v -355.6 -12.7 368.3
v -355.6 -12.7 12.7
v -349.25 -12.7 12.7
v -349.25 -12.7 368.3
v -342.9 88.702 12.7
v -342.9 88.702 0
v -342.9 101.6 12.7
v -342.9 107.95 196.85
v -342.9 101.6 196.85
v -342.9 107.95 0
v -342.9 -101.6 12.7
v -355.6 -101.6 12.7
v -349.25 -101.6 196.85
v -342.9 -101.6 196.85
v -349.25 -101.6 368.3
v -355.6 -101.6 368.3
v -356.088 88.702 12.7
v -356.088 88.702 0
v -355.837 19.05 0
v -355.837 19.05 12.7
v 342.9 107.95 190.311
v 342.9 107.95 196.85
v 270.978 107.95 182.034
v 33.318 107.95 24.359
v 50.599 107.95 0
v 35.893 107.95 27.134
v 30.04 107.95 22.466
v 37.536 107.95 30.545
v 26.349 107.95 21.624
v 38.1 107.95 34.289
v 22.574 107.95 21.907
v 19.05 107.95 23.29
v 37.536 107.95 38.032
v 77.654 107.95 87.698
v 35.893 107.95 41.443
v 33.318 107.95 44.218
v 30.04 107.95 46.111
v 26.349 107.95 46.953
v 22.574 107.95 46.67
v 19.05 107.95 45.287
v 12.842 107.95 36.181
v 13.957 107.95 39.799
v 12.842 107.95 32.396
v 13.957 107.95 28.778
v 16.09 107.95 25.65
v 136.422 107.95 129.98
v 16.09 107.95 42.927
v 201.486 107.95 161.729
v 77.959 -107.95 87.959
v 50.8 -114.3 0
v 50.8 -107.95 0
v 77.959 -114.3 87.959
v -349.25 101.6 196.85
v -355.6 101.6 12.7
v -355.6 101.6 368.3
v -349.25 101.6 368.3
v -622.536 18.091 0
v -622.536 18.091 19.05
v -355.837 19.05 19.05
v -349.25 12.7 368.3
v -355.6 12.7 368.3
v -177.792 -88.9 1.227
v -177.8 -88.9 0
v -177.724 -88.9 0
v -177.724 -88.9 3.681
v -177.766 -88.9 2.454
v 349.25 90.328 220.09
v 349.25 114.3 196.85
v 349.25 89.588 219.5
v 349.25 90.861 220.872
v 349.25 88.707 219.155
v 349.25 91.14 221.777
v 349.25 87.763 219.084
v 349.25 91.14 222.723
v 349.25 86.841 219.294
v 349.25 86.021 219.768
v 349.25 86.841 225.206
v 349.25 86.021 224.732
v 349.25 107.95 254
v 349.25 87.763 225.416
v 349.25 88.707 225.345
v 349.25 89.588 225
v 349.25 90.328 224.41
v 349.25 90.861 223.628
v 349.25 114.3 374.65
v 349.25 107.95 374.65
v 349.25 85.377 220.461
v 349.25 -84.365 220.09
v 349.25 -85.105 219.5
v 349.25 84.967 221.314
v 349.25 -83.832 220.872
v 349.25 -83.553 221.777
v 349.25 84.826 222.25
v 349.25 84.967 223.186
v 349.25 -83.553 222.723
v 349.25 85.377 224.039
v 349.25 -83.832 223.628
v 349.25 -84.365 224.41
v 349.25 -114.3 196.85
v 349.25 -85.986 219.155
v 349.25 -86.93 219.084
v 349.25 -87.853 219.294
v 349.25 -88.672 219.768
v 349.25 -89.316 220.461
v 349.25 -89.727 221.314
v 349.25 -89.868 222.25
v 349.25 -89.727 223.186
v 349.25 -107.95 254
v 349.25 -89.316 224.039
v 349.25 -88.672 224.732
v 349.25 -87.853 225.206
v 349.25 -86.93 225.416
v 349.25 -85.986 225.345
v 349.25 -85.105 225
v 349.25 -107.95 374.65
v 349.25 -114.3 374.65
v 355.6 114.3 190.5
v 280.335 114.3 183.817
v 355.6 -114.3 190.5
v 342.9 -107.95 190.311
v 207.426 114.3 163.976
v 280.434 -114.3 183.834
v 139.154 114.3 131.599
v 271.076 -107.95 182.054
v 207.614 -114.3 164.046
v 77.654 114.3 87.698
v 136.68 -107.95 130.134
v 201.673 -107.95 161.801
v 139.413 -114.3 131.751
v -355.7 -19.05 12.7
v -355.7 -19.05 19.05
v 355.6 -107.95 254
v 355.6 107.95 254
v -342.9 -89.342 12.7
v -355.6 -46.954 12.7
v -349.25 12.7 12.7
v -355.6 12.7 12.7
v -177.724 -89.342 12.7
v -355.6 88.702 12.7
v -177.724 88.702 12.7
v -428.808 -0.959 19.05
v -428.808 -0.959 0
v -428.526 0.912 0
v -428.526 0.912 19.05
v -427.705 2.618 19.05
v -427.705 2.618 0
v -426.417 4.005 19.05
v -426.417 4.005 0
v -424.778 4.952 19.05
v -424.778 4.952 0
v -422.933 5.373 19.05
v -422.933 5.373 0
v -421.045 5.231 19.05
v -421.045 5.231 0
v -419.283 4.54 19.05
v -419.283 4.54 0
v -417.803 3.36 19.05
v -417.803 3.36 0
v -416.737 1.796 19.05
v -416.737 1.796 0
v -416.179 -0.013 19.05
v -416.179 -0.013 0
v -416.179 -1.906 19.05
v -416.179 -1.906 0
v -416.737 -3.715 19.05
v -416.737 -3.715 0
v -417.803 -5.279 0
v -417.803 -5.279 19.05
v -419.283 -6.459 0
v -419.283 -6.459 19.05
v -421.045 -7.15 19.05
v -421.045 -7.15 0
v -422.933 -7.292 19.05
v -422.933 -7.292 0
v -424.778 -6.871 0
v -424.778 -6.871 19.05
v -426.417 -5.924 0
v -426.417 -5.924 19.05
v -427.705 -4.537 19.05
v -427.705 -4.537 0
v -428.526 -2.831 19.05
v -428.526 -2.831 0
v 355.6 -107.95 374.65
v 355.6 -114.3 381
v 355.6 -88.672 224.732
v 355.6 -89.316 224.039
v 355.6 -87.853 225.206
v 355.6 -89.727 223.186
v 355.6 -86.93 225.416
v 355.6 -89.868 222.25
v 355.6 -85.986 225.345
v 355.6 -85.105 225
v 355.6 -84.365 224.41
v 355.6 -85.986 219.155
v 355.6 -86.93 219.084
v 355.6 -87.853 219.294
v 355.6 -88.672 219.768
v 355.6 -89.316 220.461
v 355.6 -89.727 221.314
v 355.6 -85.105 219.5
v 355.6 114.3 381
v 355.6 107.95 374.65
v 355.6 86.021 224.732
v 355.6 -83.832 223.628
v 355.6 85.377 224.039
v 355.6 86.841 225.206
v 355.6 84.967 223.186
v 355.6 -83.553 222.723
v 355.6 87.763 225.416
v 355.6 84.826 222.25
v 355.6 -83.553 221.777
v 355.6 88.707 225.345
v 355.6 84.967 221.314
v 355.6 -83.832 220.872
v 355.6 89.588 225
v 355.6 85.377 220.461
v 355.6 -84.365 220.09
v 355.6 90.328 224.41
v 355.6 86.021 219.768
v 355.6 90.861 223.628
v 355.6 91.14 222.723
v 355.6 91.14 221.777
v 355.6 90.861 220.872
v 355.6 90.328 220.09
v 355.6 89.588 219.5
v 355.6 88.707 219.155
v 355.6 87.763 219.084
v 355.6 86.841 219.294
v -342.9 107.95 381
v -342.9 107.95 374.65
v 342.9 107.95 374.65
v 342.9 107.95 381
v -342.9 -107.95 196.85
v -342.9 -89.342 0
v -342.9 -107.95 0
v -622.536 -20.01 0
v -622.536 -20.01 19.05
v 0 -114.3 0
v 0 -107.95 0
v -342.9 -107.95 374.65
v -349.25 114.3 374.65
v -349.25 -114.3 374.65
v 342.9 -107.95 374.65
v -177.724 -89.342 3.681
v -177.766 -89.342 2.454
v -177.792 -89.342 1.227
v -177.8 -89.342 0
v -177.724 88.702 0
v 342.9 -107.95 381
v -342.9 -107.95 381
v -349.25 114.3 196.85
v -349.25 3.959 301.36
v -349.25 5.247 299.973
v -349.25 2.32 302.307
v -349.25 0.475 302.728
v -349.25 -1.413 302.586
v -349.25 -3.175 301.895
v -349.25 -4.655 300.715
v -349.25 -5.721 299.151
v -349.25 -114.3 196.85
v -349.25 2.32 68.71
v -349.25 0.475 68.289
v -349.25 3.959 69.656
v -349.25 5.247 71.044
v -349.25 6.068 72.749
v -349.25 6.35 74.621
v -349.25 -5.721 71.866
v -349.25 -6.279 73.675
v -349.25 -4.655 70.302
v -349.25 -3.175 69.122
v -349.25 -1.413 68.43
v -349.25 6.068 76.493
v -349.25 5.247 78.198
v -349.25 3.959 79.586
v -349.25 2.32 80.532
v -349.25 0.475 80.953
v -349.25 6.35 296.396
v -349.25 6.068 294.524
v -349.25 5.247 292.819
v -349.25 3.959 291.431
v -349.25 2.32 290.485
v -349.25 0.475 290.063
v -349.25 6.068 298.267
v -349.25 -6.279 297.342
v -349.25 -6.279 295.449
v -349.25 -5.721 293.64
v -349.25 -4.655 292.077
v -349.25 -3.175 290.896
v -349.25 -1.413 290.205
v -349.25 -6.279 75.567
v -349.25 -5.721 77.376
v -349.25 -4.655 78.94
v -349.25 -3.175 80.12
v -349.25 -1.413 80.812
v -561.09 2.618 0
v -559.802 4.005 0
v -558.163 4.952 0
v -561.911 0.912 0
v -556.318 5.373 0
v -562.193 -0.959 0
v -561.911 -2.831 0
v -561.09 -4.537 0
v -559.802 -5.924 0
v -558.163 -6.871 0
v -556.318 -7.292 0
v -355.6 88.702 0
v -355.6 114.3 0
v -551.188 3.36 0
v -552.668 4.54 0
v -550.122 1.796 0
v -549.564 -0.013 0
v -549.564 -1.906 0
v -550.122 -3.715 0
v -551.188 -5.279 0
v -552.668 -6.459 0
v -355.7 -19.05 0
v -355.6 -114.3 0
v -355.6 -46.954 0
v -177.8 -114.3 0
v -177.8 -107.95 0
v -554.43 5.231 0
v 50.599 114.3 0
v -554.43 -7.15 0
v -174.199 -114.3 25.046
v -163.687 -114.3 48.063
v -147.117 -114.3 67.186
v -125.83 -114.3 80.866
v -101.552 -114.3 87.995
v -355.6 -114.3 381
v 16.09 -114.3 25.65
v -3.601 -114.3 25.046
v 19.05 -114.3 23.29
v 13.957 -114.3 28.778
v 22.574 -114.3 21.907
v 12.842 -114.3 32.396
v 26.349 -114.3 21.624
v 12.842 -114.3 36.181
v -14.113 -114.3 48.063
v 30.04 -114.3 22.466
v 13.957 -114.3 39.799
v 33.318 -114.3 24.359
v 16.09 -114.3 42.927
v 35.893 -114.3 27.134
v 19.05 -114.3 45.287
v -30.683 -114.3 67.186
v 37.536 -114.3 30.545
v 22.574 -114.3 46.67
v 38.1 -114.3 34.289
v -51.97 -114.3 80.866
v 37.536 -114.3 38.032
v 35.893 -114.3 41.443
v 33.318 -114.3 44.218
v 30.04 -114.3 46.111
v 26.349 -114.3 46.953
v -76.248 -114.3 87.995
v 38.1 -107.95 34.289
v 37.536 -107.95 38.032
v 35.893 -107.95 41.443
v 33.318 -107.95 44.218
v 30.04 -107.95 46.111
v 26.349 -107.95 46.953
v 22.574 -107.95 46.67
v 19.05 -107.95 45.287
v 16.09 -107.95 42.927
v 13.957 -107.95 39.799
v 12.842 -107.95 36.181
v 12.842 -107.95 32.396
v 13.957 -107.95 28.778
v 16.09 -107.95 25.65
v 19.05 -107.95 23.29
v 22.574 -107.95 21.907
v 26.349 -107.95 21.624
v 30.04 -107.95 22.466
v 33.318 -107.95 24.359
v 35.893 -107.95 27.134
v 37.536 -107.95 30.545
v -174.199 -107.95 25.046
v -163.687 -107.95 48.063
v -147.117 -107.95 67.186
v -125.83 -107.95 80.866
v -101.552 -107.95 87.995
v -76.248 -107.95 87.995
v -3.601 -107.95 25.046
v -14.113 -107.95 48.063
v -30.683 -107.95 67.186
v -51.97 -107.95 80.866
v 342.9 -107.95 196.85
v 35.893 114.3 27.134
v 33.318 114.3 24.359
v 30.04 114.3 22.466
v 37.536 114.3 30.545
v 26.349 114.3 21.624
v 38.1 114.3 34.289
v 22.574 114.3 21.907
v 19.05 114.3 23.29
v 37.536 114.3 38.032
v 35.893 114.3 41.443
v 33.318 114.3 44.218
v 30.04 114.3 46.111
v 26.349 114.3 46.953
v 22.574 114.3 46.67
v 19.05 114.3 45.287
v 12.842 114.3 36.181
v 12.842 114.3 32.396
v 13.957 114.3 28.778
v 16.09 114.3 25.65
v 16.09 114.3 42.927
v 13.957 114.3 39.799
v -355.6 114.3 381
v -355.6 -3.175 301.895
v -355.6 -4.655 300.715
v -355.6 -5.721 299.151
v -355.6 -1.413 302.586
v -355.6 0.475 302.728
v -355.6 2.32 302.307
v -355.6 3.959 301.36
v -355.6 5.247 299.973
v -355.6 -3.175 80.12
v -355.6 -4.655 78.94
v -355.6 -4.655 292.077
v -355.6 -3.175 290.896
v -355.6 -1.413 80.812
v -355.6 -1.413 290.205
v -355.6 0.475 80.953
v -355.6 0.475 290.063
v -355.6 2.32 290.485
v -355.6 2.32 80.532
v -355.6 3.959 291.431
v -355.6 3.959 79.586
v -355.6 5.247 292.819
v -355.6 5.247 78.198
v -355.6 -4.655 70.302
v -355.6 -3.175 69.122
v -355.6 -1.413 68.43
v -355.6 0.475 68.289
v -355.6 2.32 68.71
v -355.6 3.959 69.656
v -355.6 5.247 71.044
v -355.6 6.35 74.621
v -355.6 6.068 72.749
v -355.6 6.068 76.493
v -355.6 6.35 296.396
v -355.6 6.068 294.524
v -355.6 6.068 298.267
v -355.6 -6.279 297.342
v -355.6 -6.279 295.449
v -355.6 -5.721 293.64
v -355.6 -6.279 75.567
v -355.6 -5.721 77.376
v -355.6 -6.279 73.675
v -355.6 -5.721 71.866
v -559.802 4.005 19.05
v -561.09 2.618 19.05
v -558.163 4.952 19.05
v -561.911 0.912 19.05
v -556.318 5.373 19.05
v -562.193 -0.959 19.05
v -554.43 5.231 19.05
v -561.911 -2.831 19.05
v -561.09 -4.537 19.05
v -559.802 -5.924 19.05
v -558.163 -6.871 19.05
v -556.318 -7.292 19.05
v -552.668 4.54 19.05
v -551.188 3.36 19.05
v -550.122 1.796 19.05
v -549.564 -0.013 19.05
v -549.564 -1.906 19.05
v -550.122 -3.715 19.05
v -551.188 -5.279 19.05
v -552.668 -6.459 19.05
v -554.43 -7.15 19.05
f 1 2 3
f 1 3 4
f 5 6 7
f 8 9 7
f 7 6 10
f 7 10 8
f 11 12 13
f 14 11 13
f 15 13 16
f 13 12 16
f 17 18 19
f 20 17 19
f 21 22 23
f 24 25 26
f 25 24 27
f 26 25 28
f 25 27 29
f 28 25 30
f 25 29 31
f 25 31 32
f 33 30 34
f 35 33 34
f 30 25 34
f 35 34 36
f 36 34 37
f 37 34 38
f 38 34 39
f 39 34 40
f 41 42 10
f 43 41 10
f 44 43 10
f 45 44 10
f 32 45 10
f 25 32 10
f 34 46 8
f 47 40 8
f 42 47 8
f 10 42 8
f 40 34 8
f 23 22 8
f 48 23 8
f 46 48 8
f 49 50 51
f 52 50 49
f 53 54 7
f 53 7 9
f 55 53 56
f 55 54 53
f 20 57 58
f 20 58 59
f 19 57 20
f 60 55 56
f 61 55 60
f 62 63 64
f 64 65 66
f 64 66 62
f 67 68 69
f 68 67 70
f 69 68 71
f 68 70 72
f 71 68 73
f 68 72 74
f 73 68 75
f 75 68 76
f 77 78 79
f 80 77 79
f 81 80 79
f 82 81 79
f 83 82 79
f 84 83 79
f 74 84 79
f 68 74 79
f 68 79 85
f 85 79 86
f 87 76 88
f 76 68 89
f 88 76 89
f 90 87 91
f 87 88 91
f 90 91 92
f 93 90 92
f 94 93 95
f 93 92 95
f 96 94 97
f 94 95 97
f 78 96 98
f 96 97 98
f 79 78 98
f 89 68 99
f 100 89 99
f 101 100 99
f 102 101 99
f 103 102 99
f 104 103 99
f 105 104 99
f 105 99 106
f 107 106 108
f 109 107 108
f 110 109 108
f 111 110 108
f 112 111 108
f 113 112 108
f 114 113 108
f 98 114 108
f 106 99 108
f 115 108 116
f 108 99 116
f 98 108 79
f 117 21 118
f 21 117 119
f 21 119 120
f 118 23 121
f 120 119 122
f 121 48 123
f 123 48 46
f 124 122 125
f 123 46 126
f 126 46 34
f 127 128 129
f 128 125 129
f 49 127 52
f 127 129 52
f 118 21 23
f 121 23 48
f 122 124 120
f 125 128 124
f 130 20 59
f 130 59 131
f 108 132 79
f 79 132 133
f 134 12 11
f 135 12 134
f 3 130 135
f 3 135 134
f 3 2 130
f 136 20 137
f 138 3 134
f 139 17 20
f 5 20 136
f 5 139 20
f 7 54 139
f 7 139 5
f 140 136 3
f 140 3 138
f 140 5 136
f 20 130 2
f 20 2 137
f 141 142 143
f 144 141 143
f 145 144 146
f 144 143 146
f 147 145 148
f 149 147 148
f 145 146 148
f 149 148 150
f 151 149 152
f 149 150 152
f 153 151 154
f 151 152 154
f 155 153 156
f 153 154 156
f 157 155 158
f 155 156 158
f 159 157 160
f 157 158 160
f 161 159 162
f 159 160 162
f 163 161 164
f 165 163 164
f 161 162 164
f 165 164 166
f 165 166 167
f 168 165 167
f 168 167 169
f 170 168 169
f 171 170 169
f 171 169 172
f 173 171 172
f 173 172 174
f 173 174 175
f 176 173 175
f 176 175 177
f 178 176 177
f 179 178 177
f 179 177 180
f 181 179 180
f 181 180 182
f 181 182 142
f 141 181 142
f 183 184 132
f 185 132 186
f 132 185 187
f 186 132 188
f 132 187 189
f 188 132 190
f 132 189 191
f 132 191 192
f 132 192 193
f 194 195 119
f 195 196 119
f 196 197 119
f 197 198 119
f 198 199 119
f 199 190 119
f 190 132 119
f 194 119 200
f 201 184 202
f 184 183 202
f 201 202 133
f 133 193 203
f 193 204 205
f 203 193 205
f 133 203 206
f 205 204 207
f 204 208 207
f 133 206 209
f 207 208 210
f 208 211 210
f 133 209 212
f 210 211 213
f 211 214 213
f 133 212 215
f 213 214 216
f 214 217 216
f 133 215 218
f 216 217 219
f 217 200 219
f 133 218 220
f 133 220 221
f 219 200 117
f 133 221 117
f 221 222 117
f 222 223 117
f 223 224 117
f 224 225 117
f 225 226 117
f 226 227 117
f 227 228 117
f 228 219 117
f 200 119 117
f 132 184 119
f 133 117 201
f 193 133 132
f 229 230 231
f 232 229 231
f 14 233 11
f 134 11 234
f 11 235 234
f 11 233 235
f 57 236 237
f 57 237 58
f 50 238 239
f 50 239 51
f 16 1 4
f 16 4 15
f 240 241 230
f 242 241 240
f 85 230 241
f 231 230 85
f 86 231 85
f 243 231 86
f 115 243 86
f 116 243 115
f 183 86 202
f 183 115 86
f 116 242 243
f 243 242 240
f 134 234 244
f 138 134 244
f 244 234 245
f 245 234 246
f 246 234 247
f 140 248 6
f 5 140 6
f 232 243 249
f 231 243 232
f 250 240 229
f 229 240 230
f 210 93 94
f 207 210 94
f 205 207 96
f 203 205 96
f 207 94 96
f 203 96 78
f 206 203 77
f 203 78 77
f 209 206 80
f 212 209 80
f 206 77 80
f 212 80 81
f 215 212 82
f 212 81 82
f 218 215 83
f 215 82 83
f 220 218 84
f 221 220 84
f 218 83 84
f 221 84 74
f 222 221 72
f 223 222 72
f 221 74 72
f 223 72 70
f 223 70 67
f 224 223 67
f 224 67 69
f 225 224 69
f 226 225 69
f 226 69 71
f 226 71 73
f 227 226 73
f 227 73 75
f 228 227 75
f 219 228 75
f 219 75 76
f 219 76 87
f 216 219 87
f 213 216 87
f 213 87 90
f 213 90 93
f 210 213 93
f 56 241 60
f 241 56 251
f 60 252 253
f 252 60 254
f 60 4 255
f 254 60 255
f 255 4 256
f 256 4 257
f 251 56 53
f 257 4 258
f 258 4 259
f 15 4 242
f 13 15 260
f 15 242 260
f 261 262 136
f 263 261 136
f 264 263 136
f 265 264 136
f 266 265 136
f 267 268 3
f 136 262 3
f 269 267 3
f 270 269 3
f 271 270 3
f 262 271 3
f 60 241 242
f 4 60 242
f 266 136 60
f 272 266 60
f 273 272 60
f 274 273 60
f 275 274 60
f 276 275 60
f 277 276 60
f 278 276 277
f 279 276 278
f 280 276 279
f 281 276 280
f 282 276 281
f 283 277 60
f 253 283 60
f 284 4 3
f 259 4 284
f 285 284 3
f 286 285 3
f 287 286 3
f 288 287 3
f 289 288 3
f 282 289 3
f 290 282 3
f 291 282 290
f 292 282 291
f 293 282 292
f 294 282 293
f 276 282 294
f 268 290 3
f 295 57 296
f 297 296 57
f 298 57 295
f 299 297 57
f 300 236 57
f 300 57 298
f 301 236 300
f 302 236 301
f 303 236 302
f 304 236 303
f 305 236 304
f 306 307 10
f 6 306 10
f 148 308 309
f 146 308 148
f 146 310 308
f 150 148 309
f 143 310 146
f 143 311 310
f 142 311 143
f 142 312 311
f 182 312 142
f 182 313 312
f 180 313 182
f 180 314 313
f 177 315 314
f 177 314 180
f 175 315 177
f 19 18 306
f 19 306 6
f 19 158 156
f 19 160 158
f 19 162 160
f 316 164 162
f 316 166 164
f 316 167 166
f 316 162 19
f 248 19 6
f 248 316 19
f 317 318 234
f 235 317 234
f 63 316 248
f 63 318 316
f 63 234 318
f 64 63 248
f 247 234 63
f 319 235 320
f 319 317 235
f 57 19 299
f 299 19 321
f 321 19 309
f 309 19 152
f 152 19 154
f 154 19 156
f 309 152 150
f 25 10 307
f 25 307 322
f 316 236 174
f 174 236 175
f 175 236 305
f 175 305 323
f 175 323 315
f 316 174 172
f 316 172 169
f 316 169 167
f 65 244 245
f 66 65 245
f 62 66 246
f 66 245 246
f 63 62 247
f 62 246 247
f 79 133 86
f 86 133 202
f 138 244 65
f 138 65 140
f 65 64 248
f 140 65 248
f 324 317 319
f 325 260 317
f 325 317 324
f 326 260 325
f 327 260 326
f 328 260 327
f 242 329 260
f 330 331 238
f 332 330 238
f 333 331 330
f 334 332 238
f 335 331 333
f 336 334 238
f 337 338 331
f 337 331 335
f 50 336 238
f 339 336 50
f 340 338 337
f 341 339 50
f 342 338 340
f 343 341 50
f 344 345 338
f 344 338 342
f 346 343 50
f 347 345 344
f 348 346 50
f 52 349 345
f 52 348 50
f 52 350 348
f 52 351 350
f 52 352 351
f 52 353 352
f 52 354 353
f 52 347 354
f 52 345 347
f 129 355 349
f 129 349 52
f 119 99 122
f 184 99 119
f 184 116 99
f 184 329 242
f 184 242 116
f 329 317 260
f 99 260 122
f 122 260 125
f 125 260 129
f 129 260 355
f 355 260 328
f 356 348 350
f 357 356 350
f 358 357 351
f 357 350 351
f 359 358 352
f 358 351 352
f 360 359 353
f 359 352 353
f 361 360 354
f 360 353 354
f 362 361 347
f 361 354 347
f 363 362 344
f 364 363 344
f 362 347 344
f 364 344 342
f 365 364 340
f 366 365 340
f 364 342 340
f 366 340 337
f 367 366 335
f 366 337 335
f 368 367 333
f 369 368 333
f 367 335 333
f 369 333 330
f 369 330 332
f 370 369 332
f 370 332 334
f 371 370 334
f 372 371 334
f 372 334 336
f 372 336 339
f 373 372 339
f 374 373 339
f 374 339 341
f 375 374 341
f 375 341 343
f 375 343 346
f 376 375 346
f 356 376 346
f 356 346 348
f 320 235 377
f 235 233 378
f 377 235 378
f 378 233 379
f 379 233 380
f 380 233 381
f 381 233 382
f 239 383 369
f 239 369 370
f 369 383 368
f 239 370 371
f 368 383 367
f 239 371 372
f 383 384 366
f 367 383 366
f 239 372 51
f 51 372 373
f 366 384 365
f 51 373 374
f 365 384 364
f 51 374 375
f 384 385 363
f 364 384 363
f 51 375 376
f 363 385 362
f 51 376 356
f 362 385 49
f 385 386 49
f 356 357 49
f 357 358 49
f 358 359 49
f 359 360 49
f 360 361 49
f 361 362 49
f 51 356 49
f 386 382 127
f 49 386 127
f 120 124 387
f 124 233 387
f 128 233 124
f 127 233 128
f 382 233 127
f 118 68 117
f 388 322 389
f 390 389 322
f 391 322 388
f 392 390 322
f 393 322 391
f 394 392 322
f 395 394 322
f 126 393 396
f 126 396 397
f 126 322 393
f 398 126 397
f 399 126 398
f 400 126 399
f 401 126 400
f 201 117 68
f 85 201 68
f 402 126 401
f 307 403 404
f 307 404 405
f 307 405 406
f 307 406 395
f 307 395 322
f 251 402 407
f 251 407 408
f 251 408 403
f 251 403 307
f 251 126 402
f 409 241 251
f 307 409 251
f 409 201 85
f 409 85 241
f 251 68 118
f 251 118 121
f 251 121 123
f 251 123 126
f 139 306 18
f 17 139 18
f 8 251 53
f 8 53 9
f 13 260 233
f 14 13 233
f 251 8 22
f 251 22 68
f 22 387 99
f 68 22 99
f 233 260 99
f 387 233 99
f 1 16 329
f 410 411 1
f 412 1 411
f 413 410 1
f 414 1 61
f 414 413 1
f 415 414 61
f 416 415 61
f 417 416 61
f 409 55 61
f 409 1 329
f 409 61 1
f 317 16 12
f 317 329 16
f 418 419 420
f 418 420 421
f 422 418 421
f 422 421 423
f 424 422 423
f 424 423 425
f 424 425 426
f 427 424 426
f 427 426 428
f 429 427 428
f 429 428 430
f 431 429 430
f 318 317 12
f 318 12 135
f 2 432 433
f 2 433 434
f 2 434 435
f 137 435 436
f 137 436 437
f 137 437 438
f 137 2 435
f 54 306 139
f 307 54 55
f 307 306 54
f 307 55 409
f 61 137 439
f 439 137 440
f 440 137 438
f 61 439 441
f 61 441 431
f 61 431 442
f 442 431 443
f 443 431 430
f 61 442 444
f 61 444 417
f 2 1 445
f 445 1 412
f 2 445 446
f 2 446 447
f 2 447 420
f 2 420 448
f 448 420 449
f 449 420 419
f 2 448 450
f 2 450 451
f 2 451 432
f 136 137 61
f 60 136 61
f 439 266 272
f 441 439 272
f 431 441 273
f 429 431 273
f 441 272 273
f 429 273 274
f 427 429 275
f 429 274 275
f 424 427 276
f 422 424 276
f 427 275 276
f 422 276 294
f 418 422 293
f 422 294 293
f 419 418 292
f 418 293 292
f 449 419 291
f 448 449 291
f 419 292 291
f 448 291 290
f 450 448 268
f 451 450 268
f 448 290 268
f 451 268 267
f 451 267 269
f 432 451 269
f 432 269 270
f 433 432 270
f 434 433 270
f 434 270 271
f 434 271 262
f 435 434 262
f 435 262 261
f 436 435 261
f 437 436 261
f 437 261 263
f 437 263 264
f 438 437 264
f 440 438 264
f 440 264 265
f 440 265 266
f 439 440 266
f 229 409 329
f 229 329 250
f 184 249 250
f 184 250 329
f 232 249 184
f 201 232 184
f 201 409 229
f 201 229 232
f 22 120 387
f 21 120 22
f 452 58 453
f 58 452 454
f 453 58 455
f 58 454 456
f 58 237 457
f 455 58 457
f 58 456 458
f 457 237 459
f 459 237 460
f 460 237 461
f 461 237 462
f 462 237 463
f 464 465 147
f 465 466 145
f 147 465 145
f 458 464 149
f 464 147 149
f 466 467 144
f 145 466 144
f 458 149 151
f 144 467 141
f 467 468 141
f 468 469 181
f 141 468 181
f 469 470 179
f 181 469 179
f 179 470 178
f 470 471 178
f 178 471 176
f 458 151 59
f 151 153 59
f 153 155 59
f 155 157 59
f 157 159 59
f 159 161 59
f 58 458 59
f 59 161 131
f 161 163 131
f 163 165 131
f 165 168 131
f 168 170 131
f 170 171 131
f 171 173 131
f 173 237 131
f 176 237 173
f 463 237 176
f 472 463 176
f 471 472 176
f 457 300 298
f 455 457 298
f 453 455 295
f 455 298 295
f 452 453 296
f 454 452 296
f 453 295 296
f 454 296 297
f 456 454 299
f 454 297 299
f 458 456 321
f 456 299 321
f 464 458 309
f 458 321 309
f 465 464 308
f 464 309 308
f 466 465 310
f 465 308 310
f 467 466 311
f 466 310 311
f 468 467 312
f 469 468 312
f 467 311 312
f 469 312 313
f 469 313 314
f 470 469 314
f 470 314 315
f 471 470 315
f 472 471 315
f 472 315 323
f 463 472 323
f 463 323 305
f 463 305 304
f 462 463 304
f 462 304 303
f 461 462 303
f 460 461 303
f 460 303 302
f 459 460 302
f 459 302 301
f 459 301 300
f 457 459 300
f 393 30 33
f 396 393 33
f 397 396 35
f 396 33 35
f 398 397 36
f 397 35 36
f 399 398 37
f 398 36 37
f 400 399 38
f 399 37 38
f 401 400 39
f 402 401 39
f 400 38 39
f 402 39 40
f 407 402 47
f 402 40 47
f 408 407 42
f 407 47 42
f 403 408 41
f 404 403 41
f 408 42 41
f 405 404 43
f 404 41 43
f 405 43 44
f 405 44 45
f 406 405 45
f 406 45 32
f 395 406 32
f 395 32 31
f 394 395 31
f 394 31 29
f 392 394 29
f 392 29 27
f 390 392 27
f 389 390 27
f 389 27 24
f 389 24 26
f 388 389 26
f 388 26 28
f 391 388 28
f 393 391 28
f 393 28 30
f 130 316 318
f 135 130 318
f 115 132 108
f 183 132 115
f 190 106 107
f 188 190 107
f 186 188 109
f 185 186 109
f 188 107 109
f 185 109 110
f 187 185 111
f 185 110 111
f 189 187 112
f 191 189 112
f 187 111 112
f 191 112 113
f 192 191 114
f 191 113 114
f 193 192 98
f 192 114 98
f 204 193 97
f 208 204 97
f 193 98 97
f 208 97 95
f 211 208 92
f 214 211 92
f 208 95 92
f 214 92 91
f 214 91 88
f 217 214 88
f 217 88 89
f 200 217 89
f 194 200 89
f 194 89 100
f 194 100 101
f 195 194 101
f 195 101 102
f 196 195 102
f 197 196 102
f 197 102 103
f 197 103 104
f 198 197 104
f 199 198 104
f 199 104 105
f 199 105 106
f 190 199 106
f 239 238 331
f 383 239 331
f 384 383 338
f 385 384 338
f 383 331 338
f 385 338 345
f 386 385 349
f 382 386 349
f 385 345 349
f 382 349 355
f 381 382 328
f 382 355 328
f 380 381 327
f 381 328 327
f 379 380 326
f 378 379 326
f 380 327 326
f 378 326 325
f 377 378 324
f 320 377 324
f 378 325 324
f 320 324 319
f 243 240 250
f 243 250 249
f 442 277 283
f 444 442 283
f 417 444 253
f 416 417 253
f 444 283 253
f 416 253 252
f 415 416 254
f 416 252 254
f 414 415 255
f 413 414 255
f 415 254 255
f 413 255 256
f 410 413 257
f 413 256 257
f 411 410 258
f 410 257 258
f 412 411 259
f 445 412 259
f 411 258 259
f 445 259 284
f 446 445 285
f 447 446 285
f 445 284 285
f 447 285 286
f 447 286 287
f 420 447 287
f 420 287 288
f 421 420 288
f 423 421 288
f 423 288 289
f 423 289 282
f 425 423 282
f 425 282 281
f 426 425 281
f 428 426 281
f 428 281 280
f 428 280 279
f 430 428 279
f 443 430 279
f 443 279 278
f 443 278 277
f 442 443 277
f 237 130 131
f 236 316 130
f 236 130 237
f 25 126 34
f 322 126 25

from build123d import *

# Parameters (mm, degrees)
F0_W      = 711.2
F0_H      = 228.6
F0_W_2    = 685.8
F0_H_2    = 215.9
F1_DEPTH  = 381
F2_W      = 698.5
F2_H      = 136.616886
F3_DEPTH  = 190.5
F4_DEPTH  = 254
F5_W      = 203.2
F5_H      = 355.6
F6_DEPTH  = 25.4
F8_DEPTH  = 12.7
F9_W      = 698.5
F9_H      = 136.616886
F9_H_2    = 41.183114
F10_DEPTH = 381
F12_DEPTH = 25.4
F13_W     = 25.4
F13_H     = 381
F14_DEPTH = 6.35
F15_W     = 215.9
F15_H     = 120.65
F16_DEPTH = 25.4
F18_D     = 6.35
F20_D     = 12.7
F22_DEPTH = 6.35
F24_DEPTH = 6.35
F26_D     = 25.4
F28_DEPTH = 19.05
F30_D     = 12.7


with BuildPart() as f1:
    # F0 (on Top) → F1 (new body)
    with BuildSketch(Plane.XY):
        Rectangle(F0_W, F0_H)
        Rectangle(F0_W_2, F0_H_2, mode=Mode.SUBTRACT)
    extrude(amount=F1_DEPTH)

    # F2 (on face) → F3 (cut, symmetric)
    with BuildSketch(Plane.XZ.offset(114.3)):
        with Locations((0, 306.341557)):
            Rectangle(F2_W, F2_H)
    extrude(amount=F3_DEPTH, both=True, mode=Mode.SUBTRACT)

    # F2 (on face) → F4 (cut, symmetric)
    with BuildSketch(Plane.XZ.offset(114.3)):
        with BuildLine():
            Line((355.6, 0), (355.6, 190.5))
            ThreePointArc((355.6, 190.5), (153.893772, 139.874959), (0, 0))
            Line((0, 0), (355.6, 0))
        make_face()
    extrude(amount=F4_DEPTH, both=True, mode=Mode.SUBTRACT)

    # F5 (on face) → F6 (cut)
    with BuildSketch(Plane(origin=(-355.6, 0, 0), x_dir=(0, -1, 0), z_dir=(-1, 0, 0))):
        with Locations((0, 190.5)):
            Rectangle(F5_W, F5_H)
    extrude(amount=-F6_DEPTH, mode=Mode.SUBTRACT)

    # F7 (on Top) → F8 (join)
    with BuildSketch(Plane.XY):
        Polygon((-177.723765, 88.70177), (-356.087953, 88.70177), (-355.447531, -89.342214), (-177.723765, -89.342214), align=None)
    extrude(amount=F8_DEPTH)

    # F9 (on face) → F10 (cut)
    with BuildSketch(Plane.XZ.offset(114.3)):
        with Locations((0, 306.341557)):
            Rectangle(F9_W, F9_H)
        with Locations((0, 217.441557)):
            Rectangle(F9_W, F9_H_2)
    extrude(amount=-F10_DEPTH, mode=Mode.SUBTRACT)

    # F11 (on face) → F12 (cut)
    with BuildSketch(Plane.XZ.offset(114.3)):
        with BuildLine():
            Line((-177.8, 0), (0, 0))
            ThreePointArc((0, 0), (-88.9, 88.9), (-177.8, 0))
        make_face()
    extrude(amount=-F12_DEPTH, mode=Mode.SUBTRACT)

    # F13 (on face) → F14 (join)
    with BuildSketch(Plane(origin=(-355.6, 0, 0), x_dir=(0, -1, 0), z_dir=(-1, 0, 0))):
        with Locations((0, 190.5)):
            Rectangle(F13_W, F13_H)
    extrude(amount=-F14_DEPTH)

    # F15 (on face) → F16 (cut)
    with BuildSketch(Plane.YZ.offset(355.6)):
        with Locations((0, 314.325)):
            Rectangle(F15_W, F15_H)
    extrude(amount=-F16_DEPTH, mode=Mode.SUBTRACT)

    # F18 (through all)
    with Locations(Plane.YZ.offset(355.6)):
        with Locations((-86.692668, 222.25), (88.000588, 222.25)):
            Hole(F18_D / 2)

    # F20 (through all)
    with Locations(Plane(origin=(-355.6, 0, 0), x_dir=(0, -1, 0), z_dir=(-1, 0, 0))):
        with Locations((0, 296.3956), (0, 74.620992)):
            Hole(F20_D / 2)

    # F21 (on face) → F22 (join)
    with BuildSketch(Plane.XZ.offset(114.3)):
        with BuildLine():
            ThreePointArc((77.958857, 87.959228), (35.939566, 46.673864), (0, 0))
            Line((0, 0), (50.8, 0))
            Line((50.8, 0), (77.958857, 87.959228))
        make_face()
    extrude(amount=-F22_DEPTH)

    # F23 (on face) → F24 (join)
    with BuildSketch(Plane(origin=(0, 114.3, 0), x_dir=(-1, 0, 0), z_dir=(0, 1, 0))):
        with BuildLine():
            ThreePointArc((0, 0), (-35.80659, 46.523758), (-77.65419, 87.69839))
            Line((-77.65419, 87.69839), (-50.599013, 0))
            Line((-50.599013, 0), (0, 0))
        make_face()
    extrude(amount=-F24_DEPTH)

    # F26 (through all)
    with Locations(Plane(origin=(0, 114.3, 0), x_dir=(-1, 0, 0), z_dir=(0, 1, 0))):
        with Locations((-25.399767, 34.288563)):
            Hole(F26_D / 2)

    # F27 (on face) → F28 (join)
    with BuildSketch(Plane(origin=(0, 0, 0), x_dir=(1, 0, 0), z_dir=(0, 0, -1))):
        Polygon((-355.837416, -19.05), (-355.700371, 19.049877), (-622.535691, 20.00968), (-622.535691, -18.090689), align=None)
    extrude(amount=-F28_DEPTH)

    # F30 (through all)
    with Locations(Plane.XY.offset(19.05)):
        with Locations((-555.843129, -0.959495), (-422.458004, -0.959495)):
            Hole(F30_D / 2)


solid = f1.part
